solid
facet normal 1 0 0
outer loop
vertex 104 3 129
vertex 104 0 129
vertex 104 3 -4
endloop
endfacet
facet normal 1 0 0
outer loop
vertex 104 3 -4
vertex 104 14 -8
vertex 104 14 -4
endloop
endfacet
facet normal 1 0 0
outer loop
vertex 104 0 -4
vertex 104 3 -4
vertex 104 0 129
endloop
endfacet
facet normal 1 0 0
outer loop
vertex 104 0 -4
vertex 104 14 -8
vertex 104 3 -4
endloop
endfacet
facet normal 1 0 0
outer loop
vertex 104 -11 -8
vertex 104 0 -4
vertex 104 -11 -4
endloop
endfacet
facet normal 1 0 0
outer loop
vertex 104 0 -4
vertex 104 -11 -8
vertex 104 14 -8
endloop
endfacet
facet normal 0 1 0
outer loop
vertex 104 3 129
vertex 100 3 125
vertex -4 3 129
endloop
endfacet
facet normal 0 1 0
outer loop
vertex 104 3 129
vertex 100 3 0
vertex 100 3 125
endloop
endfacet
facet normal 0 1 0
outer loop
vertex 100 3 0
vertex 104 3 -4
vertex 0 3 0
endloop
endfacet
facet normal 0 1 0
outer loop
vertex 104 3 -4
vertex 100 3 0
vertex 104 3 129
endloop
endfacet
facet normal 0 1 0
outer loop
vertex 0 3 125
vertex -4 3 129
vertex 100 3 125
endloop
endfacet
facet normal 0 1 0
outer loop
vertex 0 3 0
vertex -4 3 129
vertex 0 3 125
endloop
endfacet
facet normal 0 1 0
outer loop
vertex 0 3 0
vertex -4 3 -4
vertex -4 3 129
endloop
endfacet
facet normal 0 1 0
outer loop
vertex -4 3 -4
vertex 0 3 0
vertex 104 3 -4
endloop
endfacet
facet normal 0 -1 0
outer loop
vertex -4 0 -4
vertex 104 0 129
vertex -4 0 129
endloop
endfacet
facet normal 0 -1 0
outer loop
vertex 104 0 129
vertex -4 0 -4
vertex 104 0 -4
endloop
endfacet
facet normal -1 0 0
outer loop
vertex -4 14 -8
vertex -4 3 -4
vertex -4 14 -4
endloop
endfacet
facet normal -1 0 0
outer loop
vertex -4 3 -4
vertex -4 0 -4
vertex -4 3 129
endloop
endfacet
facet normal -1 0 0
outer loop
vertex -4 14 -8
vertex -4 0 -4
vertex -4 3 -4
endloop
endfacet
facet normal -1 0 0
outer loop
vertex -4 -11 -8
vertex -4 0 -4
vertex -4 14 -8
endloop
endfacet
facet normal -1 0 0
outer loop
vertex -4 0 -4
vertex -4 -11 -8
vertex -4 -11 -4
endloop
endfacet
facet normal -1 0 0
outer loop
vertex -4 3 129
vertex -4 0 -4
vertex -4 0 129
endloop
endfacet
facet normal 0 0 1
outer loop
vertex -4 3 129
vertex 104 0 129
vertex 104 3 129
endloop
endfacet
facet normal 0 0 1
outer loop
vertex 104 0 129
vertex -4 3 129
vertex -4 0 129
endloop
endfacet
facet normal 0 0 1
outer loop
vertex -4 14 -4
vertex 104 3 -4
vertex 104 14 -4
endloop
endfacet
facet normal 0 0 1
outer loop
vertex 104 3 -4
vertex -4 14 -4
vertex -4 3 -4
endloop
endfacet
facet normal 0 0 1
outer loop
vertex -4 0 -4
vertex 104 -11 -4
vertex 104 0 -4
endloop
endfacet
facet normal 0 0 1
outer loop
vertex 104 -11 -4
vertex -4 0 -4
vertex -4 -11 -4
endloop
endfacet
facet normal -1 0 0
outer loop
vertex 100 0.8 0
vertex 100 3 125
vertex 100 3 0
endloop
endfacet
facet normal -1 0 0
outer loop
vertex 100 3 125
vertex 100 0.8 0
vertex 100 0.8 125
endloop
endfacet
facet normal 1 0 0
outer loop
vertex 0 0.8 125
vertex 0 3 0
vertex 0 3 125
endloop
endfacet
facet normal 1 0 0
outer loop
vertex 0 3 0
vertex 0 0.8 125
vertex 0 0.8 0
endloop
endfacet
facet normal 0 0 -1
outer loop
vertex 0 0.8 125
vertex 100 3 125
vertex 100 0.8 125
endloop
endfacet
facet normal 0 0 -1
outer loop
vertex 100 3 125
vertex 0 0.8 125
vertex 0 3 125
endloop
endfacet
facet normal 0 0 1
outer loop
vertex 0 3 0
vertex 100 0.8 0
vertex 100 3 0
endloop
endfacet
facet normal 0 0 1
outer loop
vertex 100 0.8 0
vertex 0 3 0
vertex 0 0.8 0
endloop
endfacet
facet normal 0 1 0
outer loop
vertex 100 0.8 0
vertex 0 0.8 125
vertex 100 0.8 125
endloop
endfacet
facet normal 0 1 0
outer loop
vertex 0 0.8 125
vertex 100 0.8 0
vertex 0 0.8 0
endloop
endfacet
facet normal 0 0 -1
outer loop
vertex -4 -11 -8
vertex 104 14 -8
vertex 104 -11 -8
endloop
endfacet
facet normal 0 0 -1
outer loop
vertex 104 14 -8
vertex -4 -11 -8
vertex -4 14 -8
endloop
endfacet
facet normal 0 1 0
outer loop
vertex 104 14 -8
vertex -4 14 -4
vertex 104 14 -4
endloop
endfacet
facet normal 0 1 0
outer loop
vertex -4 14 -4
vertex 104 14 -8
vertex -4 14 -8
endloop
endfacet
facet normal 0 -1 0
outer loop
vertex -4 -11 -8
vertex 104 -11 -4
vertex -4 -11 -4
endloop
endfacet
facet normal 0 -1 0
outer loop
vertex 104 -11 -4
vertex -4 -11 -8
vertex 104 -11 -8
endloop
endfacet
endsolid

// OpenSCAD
// Lithophane of lithophane_photo.png, 100 mm wide, 0.8 mm at the brightest and 3 mm at
// the darkest, standing on its own foot.
img = "lithophane_photo.png";
px = [300, 375];        // image size in pixels
width = 100;
min_t = 0.8;
max_t = 3.0;
frame = 4;
foot_d = 25;
foot_h = 4;

s = width / px[0];
h = px[1] * s;

module picture() {
    // surface(): white = 100, black = 0; invert makes dark thick
    translate([0, 0, min_t])
        scale([s, s, (max_t - min_t) / 100])
            surface(file = img, invert = true, convexity = 5);
    cube([width, h, min_t]);
}

// stand it up: picture in the XZ plane, viewed from -Y
rotate([90, 0, 0]) mirror([0, 0, 1]) {
    picture();
    // frame
    difference() {
        translate([-frame, -frame, 0]) cube([width + 2 * frame, h + 2 * frame, max_t]);
        cube([width, h, max_t + 1]);
    }
}
// foot
translate([-frame, -foot_d / 2 + max_t / 2, -frame - foot_h]) cube([width + 2 * frame, foot_d, foot_h]);
